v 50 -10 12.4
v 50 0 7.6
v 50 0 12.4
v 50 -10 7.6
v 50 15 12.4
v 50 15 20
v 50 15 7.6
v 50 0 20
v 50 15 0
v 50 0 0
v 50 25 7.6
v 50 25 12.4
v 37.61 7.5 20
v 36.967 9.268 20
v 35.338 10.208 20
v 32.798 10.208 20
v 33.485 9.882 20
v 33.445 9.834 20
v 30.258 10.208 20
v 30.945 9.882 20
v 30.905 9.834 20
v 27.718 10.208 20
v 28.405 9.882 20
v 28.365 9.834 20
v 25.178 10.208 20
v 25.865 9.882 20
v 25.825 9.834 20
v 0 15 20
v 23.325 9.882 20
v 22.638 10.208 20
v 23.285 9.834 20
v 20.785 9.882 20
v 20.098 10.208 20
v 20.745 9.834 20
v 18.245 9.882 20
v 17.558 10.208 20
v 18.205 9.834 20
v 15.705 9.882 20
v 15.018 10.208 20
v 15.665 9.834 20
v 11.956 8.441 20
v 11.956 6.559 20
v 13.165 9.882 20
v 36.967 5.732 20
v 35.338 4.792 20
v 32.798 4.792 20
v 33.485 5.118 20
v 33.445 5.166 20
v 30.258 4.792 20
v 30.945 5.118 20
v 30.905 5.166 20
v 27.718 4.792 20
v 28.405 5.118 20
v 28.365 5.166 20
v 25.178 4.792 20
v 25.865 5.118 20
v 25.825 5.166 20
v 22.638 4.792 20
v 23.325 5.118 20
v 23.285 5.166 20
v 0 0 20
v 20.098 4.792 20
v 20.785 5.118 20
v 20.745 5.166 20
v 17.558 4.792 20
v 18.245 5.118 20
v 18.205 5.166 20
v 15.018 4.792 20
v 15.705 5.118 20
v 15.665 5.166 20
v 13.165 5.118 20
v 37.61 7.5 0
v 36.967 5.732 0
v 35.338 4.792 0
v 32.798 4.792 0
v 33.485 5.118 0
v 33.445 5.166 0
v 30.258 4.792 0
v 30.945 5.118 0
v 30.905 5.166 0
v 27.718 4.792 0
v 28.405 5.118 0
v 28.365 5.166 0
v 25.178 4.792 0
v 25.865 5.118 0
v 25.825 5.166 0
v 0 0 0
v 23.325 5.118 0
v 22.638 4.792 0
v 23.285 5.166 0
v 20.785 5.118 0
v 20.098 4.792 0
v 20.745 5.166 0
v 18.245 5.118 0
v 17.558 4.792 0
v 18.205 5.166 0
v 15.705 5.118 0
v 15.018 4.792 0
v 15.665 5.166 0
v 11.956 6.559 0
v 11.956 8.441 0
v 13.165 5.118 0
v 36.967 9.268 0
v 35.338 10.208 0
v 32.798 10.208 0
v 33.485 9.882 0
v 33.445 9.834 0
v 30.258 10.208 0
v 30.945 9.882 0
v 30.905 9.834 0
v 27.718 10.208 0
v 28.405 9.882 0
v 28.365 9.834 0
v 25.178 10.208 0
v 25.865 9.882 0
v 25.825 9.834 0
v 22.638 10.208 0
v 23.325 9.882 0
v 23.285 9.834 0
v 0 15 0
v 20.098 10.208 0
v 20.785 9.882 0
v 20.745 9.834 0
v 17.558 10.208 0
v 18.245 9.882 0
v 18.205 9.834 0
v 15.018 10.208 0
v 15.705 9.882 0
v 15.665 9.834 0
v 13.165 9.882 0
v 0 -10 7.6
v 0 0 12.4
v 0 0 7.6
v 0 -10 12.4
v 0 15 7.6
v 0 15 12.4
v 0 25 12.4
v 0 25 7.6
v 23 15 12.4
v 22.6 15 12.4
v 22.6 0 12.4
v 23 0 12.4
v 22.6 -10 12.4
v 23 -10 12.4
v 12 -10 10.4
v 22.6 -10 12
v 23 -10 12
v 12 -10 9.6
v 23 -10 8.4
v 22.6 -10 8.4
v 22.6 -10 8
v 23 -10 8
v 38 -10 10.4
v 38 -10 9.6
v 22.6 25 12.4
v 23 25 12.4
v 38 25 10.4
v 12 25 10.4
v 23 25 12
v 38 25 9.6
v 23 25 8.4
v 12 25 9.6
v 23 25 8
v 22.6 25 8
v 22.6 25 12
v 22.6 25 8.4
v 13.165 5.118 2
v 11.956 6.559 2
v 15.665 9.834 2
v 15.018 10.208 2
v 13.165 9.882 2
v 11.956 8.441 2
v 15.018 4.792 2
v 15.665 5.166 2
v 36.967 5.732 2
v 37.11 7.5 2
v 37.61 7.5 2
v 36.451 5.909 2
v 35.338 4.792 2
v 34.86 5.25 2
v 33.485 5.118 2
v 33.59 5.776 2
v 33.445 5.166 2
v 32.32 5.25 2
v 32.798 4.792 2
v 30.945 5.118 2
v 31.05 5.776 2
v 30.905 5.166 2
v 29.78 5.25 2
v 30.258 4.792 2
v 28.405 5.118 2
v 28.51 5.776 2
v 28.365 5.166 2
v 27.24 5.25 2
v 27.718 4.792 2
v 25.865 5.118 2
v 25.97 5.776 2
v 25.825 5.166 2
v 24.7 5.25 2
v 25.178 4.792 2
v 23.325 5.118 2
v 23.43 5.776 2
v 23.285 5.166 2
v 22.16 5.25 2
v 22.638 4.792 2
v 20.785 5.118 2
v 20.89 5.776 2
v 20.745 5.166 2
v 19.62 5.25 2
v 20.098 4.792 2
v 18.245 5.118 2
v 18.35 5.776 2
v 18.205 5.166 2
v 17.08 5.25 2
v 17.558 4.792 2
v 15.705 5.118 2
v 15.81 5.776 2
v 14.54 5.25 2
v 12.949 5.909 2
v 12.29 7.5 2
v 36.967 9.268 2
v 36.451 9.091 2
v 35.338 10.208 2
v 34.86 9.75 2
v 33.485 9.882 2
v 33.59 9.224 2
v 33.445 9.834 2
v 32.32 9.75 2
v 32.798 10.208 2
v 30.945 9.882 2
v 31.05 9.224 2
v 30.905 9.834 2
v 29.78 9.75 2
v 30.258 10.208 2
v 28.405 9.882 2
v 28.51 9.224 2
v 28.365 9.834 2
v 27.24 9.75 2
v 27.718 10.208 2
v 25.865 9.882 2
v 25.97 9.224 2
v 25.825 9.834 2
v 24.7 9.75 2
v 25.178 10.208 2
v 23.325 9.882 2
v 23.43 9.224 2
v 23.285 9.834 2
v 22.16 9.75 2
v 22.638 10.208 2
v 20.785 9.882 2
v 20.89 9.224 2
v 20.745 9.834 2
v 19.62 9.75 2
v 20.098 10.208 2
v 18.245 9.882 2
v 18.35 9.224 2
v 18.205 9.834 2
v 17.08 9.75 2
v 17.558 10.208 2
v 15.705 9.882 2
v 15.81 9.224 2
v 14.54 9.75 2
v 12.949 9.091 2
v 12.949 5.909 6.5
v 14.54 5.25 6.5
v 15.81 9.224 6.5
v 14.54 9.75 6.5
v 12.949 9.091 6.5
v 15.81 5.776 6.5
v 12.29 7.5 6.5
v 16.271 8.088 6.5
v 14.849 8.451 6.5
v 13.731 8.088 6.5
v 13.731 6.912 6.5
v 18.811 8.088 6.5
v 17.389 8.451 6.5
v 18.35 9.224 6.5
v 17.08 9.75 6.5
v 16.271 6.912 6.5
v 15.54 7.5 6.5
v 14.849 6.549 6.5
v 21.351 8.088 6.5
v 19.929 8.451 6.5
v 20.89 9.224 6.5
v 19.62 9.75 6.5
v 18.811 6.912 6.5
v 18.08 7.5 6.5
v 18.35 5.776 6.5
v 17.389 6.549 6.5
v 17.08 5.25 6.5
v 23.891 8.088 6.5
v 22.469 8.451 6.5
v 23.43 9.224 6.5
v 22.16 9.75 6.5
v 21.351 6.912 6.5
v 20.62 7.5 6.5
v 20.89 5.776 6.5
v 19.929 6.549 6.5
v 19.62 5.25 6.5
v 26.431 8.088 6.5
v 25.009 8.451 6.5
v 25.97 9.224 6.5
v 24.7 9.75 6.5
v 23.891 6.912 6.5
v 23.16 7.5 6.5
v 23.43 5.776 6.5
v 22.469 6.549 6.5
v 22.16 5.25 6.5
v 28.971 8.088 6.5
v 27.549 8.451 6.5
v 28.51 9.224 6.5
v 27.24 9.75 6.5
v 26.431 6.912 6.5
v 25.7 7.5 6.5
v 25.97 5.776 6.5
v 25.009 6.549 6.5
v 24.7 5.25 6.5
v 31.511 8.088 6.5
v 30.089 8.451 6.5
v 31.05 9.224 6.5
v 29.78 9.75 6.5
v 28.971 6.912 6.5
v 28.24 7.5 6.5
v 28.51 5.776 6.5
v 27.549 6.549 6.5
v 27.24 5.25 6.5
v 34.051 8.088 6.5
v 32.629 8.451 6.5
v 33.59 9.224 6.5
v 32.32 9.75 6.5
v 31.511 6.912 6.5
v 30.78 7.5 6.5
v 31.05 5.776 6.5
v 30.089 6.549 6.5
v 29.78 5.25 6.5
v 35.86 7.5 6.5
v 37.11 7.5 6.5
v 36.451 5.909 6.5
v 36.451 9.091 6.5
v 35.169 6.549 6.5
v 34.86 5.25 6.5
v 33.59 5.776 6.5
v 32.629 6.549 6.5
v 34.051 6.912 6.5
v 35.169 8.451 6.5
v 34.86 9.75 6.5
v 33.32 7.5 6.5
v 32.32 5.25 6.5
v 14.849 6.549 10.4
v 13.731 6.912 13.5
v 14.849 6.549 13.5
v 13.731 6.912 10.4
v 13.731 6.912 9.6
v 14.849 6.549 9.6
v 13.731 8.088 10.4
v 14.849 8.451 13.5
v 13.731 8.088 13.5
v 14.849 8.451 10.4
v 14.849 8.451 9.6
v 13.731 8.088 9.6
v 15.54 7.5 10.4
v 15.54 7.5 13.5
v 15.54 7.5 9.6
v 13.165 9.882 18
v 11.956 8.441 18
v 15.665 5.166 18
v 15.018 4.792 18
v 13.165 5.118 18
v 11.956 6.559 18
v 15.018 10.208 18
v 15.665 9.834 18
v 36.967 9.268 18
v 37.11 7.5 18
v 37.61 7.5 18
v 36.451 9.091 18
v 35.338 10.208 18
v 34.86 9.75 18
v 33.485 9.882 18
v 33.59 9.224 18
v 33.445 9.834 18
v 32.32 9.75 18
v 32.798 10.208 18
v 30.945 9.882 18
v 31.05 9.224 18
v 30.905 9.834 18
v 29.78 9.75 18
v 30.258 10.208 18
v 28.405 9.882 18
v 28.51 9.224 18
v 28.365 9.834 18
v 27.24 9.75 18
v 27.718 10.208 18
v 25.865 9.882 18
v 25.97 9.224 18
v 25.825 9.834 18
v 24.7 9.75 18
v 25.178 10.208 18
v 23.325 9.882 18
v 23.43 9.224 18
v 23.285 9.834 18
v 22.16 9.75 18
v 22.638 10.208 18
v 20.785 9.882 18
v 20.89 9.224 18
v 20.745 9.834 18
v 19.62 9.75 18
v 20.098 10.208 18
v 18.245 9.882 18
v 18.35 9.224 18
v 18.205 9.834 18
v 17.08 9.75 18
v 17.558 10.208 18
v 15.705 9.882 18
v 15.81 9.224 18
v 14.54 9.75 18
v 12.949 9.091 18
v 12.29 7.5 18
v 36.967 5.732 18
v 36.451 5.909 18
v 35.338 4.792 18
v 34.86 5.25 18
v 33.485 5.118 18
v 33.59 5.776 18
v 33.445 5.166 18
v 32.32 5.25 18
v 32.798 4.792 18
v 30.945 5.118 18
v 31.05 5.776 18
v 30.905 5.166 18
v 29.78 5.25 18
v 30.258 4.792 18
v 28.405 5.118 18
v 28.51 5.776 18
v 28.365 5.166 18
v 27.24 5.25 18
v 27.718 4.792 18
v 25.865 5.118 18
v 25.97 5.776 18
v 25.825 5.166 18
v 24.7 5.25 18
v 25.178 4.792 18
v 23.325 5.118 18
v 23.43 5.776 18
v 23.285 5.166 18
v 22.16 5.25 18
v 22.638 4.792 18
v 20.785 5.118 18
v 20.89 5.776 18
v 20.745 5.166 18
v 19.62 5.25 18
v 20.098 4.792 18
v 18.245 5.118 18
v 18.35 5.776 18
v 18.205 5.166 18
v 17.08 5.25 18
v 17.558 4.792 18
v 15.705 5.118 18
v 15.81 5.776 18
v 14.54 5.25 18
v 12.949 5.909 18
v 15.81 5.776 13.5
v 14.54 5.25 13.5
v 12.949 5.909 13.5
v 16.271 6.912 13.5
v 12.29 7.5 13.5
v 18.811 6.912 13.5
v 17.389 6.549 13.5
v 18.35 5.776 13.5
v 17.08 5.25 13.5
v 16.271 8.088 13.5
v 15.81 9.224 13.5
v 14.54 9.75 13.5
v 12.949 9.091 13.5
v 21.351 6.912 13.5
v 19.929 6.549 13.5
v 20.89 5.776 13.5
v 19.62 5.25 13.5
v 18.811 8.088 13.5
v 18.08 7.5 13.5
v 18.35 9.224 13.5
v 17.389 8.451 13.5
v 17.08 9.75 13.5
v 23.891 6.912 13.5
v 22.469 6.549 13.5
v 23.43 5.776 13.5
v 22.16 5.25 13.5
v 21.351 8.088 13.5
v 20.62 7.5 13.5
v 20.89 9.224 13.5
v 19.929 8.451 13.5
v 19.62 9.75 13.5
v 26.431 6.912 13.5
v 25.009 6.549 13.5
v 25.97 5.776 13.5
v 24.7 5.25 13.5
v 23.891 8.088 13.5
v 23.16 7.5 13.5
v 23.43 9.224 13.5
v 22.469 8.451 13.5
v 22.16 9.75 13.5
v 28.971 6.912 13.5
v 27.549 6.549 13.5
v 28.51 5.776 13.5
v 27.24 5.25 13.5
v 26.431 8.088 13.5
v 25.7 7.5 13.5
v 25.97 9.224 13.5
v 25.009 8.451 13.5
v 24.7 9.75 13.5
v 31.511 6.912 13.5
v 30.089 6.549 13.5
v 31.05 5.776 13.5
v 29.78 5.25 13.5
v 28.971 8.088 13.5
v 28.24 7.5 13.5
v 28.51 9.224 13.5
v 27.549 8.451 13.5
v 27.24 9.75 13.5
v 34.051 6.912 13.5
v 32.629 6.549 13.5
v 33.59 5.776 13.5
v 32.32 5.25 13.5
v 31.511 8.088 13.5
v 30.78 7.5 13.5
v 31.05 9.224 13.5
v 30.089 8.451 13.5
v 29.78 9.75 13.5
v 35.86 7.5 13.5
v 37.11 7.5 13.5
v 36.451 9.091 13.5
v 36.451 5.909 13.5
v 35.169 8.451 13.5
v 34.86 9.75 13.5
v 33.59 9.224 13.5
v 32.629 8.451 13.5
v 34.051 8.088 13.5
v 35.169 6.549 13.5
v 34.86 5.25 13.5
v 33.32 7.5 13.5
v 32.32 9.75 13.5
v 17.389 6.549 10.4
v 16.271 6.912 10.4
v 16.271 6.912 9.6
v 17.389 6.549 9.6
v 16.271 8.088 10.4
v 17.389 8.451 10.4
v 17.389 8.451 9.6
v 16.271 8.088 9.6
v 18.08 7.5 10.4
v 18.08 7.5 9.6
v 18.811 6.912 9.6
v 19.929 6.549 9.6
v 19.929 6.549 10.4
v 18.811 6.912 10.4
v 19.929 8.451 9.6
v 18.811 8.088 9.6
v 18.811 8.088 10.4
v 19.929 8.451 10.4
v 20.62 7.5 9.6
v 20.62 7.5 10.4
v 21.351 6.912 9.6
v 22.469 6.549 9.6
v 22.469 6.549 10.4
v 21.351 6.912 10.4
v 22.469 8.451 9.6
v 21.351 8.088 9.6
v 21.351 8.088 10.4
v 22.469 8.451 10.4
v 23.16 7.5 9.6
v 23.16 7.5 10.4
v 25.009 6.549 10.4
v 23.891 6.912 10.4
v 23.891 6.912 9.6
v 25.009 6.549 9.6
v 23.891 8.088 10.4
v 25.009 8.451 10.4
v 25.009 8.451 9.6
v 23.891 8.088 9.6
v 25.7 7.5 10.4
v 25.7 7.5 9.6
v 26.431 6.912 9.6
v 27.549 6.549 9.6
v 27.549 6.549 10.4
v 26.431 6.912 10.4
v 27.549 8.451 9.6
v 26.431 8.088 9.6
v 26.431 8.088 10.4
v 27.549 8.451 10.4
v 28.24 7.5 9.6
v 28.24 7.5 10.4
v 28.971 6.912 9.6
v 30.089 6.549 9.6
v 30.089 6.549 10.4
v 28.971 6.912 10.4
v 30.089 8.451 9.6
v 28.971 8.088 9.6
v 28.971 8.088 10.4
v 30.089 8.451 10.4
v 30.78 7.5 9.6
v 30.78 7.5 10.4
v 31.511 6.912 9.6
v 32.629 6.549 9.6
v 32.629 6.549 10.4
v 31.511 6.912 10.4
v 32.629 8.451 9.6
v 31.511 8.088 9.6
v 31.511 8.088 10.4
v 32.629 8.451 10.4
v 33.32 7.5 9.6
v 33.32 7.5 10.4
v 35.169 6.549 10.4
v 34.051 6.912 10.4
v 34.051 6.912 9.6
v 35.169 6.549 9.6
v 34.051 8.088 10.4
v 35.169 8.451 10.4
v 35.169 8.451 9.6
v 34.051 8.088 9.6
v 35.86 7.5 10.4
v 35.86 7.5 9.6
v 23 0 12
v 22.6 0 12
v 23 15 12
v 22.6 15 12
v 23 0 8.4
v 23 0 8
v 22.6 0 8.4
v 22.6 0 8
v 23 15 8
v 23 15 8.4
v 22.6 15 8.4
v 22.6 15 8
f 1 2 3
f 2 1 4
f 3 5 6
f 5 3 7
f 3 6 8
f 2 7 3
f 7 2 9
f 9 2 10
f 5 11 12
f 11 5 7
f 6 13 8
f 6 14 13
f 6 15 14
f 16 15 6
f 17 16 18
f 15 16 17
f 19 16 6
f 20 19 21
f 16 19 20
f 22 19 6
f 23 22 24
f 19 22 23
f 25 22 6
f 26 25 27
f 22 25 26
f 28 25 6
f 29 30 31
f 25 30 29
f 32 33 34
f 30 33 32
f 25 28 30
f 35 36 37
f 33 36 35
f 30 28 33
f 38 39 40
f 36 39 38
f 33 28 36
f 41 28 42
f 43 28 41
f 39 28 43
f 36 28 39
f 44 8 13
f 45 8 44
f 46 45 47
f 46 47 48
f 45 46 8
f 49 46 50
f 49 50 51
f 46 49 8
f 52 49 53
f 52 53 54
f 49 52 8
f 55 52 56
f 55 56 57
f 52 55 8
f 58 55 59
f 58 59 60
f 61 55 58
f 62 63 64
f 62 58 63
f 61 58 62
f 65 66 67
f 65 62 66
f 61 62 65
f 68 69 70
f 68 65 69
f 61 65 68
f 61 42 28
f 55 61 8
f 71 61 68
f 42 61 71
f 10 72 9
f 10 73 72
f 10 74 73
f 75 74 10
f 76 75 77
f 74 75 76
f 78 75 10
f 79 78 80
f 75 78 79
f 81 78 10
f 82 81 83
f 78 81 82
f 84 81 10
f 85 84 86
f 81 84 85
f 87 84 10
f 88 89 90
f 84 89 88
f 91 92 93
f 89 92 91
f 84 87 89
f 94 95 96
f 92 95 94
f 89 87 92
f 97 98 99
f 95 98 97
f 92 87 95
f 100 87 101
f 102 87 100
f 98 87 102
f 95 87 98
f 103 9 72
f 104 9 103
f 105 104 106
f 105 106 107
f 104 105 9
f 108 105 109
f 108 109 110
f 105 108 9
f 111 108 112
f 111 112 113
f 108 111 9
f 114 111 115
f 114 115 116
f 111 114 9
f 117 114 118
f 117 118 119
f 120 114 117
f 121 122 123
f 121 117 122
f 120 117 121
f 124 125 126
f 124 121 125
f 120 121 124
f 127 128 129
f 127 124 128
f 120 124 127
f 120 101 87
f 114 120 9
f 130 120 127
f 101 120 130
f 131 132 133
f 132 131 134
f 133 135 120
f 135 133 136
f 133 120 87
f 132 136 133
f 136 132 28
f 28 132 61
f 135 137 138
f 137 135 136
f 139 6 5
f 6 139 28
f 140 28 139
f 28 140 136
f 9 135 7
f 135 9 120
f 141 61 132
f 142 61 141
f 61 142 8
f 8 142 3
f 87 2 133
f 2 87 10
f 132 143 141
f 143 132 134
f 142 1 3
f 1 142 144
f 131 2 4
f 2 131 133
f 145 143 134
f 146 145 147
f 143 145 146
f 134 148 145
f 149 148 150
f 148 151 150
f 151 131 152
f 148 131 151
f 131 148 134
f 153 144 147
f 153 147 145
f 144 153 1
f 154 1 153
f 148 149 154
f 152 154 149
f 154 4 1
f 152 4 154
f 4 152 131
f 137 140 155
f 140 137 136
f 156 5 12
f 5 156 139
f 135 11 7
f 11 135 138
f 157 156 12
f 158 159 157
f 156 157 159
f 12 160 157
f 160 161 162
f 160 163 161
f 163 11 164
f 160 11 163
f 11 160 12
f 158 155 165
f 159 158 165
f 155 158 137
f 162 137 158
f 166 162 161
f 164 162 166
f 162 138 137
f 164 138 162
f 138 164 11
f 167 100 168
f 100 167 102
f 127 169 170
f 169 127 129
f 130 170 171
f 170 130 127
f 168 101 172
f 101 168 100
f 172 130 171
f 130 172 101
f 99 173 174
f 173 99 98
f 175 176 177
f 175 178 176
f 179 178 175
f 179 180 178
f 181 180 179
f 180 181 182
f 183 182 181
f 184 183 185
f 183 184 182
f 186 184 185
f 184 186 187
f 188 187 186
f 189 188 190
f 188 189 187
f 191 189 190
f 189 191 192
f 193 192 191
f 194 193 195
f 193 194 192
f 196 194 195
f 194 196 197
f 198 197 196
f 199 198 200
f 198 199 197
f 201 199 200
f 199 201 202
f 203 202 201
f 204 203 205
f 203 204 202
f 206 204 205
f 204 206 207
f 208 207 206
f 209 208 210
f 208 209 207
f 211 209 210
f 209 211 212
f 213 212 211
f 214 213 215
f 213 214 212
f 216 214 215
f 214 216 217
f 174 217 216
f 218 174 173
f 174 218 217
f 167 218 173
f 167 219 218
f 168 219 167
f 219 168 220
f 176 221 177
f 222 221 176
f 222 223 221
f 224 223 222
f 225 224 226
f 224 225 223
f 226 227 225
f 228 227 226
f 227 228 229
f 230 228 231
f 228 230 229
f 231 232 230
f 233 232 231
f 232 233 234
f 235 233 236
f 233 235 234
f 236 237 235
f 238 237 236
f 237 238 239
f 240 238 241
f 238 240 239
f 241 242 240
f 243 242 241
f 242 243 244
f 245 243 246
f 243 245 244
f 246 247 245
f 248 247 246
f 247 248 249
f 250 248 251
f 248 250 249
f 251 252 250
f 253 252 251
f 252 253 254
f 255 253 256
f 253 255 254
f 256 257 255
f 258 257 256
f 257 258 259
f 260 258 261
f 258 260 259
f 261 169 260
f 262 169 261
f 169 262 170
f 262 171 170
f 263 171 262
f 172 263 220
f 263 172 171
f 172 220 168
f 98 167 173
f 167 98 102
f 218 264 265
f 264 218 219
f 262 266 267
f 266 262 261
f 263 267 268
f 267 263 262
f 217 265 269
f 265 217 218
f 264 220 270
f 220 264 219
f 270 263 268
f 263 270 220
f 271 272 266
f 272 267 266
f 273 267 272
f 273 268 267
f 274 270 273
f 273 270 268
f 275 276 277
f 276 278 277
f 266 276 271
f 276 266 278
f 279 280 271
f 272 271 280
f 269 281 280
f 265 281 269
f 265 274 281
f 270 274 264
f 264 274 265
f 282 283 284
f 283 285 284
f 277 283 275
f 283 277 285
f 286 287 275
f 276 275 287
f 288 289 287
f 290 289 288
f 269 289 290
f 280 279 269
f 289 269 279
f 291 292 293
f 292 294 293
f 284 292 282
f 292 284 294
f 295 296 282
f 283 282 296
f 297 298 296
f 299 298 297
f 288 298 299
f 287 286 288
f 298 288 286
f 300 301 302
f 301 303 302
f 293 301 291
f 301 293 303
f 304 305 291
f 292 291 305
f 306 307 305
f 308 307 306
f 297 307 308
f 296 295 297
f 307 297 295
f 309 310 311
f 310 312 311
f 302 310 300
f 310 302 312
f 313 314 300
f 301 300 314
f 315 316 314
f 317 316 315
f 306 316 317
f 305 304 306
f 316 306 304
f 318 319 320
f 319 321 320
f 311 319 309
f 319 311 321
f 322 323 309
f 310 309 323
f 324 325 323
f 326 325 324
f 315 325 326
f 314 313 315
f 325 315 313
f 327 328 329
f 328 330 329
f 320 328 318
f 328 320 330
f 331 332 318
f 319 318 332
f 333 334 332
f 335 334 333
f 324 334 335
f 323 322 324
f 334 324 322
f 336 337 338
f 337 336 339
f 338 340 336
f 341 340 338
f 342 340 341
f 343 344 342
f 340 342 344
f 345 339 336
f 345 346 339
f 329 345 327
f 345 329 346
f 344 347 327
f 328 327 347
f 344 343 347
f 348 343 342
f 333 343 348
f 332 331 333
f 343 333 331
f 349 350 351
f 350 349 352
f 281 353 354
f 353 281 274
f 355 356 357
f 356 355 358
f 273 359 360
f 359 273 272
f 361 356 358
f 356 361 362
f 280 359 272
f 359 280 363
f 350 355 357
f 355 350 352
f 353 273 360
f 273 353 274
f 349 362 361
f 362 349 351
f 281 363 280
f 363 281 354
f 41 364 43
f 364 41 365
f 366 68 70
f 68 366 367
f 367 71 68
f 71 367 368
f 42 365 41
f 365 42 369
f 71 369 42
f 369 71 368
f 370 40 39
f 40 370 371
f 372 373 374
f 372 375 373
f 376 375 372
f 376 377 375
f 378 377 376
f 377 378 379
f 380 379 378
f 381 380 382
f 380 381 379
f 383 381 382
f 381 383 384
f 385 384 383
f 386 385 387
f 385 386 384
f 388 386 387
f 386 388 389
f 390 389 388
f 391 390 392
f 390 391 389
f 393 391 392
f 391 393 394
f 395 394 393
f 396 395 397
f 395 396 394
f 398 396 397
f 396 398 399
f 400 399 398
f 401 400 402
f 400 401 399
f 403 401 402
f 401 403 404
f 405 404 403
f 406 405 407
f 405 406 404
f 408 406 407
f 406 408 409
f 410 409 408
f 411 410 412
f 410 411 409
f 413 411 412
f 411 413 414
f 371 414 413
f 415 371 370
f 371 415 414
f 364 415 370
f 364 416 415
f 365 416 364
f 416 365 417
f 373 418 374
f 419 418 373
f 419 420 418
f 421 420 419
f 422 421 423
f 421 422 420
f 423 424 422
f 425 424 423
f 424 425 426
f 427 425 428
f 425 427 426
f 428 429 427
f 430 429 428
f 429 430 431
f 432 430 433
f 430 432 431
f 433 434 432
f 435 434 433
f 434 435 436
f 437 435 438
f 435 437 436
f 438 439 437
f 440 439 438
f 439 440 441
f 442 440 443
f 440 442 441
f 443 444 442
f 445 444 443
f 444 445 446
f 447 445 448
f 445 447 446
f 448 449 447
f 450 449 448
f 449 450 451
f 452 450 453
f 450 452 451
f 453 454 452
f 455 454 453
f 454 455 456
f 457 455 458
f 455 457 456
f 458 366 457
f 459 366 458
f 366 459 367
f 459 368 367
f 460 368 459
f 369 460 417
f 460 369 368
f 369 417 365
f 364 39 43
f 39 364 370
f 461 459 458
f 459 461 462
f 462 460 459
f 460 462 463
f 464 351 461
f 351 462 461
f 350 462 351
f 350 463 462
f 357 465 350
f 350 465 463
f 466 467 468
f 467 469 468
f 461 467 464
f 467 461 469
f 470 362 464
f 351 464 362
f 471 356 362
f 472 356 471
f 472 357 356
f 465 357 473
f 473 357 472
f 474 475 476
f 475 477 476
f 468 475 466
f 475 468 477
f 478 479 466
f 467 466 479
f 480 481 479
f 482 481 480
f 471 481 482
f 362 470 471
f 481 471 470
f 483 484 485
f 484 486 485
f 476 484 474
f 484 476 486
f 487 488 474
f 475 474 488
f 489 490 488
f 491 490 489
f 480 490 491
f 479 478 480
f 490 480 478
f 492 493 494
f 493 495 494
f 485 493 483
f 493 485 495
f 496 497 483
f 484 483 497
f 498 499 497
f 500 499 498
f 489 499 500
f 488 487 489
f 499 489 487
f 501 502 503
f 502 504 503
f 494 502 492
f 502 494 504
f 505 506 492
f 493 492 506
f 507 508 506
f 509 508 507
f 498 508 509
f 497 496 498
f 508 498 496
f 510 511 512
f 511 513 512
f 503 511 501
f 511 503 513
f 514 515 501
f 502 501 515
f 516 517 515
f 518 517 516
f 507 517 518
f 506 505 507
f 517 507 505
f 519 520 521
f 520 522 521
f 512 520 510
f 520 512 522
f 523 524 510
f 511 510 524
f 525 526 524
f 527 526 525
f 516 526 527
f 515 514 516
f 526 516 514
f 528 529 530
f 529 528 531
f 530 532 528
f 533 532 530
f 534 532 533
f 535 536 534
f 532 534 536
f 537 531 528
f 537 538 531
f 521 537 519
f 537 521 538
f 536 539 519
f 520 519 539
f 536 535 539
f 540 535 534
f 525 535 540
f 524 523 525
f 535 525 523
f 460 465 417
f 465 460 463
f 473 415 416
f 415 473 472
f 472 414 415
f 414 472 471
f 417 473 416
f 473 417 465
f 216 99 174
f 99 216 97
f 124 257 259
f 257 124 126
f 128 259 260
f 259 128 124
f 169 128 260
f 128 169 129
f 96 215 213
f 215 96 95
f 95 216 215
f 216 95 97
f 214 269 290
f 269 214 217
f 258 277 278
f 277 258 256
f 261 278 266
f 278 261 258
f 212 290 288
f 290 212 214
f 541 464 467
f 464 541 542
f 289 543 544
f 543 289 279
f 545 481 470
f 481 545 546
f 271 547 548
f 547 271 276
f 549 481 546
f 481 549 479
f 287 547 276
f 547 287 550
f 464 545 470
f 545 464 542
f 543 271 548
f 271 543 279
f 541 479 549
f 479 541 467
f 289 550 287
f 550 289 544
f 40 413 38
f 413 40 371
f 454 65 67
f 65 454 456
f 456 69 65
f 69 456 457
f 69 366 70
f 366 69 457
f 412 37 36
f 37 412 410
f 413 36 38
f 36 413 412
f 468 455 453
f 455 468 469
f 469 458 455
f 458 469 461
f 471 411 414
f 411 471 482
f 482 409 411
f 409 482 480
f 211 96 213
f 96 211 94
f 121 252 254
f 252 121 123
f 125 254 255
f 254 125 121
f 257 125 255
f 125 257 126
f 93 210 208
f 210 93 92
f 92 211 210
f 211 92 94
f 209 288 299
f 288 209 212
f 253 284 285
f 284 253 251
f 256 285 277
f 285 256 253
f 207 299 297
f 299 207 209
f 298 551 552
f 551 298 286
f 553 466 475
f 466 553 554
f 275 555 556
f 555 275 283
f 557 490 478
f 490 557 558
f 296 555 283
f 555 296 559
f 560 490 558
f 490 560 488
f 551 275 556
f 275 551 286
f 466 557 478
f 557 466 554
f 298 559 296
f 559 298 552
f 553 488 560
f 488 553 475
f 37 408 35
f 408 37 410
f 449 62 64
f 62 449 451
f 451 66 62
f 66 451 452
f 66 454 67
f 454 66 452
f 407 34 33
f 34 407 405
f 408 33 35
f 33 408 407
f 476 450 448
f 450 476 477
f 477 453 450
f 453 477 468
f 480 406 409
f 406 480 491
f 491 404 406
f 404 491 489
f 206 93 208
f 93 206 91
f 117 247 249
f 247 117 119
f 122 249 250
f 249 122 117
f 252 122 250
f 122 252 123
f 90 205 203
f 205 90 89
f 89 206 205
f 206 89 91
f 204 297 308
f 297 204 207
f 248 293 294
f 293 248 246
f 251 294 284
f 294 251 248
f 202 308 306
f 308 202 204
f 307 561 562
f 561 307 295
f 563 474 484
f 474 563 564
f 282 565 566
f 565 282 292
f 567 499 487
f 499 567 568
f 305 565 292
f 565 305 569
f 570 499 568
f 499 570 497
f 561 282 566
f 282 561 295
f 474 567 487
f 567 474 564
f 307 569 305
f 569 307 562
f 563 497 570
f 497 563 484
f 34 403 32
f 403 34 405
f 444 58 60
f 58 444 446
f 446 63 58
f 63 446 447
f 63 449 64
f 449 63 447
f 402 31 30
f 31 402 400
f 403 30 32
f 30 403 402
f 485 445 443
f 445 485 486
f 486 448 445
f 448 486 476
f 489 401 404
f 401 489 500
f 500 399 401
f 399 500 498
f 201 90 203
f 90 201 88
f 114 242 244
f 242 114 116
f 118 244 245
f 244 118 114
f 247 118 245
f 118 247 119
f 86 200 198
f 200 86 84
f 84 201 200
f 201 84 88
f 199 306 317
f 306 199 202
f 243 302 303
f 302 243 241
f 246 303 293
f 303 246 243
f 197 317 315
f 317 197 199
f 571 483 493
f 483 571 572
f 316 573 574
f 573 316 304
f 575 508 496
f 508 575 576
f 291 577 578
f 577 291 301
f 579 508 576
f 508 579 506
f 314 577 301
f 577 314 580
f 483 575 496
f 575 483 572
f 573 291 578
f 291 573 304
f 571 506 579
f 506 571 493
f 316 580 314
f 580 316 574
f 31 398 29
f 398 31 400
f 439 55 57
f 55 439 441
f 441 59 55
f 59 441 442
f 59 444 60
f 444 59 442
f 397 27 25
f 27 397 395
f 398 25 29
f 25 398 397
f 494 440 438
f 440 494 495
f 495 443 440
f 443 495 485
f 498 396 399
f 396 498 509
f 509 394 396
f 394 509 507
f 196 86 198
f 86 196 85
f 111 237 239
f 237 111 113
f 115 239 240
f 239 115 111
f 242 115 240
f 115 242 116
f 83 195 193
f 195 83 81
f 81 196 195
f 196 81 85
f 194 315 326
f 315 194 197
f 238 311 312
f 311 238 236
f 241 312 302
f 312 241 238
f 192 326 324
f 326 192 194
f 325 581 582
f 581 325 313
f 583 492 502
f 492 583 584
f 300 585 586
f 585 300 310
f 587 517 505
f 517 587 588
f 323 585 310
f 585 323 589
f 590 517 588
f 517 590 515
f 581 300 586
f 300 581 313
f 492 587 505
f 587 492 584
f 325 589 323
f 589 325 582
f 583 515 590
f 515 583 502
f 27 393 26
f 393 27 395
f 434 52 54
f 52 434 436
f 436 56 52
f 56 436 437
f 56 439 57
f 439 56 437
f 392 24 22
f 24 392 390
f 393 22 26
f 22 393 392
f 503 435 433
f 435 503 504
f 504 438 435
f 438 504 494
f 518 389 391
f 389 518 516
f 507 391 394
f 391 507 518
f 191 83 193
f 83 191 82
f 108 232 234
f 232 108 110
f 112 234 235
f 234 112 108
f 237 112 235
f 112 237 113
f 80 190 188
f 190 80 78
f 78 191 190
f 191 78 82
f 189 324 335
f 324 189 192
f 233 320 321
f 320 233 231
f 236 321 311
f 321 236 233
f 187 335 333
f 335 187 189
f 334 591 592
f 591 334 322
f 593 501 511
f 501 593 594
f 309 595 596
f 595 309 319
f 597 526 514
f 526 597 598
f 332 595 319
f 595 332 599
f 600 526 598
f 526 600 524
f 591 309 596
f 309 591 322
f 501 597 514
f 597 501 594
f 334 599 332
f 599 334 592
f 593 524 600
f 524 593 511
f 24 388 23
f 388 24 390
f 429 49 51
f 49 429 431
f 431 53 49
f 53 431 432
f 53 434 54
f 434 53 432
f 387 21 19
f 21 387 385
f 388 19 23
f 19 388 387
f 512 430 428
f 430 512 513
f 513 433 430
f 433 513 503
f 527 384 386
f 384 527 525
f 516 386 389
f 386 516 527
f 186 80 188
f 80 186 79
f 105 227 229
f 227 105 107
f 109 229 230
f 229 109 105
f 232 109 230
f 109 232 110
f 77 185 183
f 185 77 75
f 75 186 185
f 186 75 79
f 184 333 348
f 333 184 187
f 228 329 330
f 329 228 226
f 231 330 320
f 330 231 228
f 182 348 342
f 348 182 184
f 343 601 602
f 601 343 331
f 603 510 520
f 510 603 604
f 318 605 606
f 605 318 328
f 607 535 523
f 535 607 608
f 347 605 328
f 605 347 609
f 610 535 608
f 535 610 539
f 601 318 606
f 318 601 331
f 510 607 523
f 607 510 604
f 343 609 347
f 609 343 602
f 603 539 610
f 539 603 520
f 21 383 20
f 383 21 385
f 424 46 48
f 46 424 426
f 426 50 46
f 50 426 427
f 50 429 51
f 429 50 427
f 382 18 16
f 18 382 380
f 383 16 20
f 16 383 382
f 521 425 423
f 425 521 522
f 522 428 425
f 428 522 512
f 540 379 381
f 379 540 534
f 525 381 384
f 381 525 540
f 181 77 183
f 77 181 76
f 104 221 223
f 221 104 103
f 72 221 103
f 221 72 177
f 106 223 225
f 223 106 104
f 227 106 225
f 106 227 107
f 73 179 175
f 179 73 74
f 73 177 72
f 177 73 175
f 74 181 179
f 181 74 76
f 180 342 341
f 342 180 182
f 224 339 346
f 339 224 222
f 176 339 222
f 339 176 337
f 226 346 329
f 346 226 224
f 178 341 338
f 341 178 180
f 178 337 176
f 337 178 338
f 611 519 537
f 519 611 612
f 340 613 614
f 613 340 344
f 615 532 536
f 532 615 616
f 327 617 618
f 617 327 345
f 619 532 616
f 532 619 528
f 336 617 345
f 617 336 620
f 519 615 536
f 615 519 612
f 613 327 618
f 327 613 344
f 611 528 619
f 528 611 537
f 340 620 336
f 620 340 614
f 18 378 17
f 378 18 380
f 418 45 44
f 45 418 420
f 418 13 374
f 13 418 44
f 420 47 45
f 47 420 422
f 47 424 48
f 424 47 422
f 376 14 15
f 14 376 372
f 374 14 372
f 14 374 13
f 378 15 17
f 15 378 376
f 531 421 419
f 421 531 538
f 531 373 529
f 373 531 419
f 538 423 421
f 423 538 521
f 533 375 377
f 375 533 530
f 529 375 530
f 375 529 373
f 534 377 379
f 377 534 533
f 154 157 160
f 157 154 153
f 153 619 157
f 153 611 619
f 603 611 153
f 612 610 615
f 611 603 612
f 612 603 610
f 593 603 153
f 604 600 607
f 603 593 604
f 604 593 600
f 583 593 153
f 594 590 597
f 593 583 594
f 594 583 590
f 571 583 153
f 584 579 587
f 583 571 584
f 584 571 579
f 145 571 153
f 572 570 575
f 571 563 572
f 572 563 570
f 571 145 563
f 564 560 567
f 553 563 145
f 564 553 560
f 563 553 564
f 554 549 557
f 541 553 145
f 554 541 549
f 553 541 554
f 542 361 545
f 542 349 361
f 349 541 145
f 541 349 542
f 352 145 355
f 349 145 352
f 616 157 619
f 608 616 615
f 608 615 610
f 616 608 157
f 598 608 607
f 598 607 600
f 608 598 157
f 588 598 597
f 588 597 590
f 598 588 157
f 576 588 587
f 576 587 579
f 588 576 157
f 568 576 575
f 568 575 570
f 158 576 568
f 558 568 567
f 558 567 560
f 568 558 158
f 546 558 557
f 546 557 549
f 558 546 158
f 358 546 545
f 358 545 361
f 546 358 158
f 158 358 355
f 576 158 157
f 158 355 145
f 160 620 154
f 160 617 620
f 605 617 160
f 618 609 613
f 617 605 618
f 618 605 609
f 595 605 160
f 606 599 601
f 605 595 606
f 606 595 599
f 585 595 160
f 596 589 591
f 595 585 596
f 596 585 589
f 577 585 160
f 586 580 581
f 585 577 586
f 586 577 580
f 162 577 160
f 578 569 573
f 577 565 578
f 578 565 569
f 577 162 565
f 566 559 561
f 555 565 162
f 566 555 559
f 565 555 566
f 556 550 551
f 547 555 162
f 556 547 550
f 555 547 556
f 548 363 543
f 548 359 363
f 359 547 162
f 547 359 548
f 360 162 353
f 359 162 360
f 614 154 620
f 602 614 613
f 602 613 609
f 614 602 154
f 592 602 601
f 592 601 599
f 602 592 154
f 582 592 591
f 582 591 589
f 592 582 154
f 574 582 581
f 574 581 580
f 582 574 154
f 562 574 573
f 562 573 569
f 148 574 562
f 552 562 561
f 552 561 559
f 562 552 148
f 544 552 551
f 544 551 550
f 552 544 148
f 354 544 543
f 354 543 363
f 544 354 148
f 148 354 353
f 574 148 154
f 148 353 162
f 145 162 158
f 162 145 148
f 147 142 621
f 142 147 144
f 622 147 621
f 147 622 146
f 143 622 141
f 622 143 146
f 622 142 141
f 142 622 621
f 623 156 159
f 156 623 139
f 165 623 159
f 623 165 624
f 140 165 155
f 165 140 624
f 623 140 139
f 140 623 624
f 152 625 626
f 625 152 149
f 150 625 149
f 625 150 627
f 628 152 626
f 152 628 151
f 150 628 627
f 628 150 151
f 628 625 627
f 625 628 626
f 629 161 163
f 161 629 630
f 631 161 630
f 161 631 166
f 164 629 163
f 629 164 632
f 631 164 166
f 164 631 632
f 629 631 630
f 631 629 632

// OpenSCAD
led_beam_diam = 2;
led_beam_height = 5;
led_body_diam = 4.5;
led_body_height = 4.5;
led_rand_diam = 5.5;
led_rand_height = 2;

led_spacing = 2.54;

nr_of_dots = 9;

box_width = 50;
box_depth = 15;
box_height = 20;

slide_width = 26;
slide_height = 0.8;
slide_depth = 10;
slide_thickness = 2;

slide_x = (box_width - slide_width - slide_thickness) / 2;
slide_z = (box_height - slide_height - 2 * slide_thickness) / 2;
slide_outer_width = slide_width + 2 * slide_thickness;

module led(x = 0, y = 0, z = 0)
{
    
    translate([x, y, z])
    {
        // Led rand.
        cylinder(h = led_rand_height, r1 = led_rand_diam / 2, r2 = led_rand_diam / 2);
        
    } 
        
    // Led body.
    translate([x, y, z + led_rand_height])
    {
        cylinder(h = led_body_height, r1 = led_body_diam / 2, r2 = led_body_diam / 2);
    }
        
    // lead beam.
    translate([x, y, z + led_rand_height + led_body_height])
    {
        cylinder(h = led_beam_height, r1 = led_beam_diam / 2, r2 = led_beam_diam / 2);
    }

}

difference()
{
    union()
    { 
        // Main box.
        cube(size = [box_width, box_depth, box_height]);
        
        // Slide left.
        translate([0, -slide_depth, slide_z])
            cube(size = [box_width,
                slide_depth, 
                slide_height + 2 * slide_thickness]);

        // Slide right.
        translate([0, box_depth, slide_z])
            cube(size = [box_width,
                slide_depth, 
                slide_height + 2 * slide_thickness]);
                
    }
    
    slide_x = (box_width - slide_width) / 2;

    // slide opening.
    translate([slide_x,
            -slide_depth, 
            (box_height - slide_height) / 2])
        cube(size = [slide_width, 
            slide_depth + slide_depth + box_depth, slide_height]);
    
    // Row of IR Leds.
    for (x = [slide_x + led_spacing : 2.54 : box_width - slide_x -      led_spacing])
    {
        led(x, box_depth / 2, 0);
        //led_rand_height + led_body_height + led_beam_height);
        
        rotate(a = [180, 0, 0])
            led(x, -(box_depth / 2), -box_height);
        
    }
    
    // Groove for permament dotted line.
    grove_depth = 0.4;
    grove_x = 22.6;
    slide_top = slide_z + slide_thickness + slide_height + slide_thickness;
    slide_bottom = slide_z;
    translate([grove_x, -slide_depth, slide_top - grove_depth])
        cube(size = [grove_depth, slide_depth, grove_depth]);
    translate([grove_x, box_depth, slide_top - grove_depth])
        cube(size = [grove_depth, slide_depth, grove_depth]);

    translate([grove_x, -slide_depth, slide_z + grove_depth])
        cube(size = [grove_depth, slide_depth, grove_depth]);
    translate([grove_x, box_depth, slide_z + grove_depth])
        cube(size = [grove_depth, slide_depth, grove_depth]);

    
}
